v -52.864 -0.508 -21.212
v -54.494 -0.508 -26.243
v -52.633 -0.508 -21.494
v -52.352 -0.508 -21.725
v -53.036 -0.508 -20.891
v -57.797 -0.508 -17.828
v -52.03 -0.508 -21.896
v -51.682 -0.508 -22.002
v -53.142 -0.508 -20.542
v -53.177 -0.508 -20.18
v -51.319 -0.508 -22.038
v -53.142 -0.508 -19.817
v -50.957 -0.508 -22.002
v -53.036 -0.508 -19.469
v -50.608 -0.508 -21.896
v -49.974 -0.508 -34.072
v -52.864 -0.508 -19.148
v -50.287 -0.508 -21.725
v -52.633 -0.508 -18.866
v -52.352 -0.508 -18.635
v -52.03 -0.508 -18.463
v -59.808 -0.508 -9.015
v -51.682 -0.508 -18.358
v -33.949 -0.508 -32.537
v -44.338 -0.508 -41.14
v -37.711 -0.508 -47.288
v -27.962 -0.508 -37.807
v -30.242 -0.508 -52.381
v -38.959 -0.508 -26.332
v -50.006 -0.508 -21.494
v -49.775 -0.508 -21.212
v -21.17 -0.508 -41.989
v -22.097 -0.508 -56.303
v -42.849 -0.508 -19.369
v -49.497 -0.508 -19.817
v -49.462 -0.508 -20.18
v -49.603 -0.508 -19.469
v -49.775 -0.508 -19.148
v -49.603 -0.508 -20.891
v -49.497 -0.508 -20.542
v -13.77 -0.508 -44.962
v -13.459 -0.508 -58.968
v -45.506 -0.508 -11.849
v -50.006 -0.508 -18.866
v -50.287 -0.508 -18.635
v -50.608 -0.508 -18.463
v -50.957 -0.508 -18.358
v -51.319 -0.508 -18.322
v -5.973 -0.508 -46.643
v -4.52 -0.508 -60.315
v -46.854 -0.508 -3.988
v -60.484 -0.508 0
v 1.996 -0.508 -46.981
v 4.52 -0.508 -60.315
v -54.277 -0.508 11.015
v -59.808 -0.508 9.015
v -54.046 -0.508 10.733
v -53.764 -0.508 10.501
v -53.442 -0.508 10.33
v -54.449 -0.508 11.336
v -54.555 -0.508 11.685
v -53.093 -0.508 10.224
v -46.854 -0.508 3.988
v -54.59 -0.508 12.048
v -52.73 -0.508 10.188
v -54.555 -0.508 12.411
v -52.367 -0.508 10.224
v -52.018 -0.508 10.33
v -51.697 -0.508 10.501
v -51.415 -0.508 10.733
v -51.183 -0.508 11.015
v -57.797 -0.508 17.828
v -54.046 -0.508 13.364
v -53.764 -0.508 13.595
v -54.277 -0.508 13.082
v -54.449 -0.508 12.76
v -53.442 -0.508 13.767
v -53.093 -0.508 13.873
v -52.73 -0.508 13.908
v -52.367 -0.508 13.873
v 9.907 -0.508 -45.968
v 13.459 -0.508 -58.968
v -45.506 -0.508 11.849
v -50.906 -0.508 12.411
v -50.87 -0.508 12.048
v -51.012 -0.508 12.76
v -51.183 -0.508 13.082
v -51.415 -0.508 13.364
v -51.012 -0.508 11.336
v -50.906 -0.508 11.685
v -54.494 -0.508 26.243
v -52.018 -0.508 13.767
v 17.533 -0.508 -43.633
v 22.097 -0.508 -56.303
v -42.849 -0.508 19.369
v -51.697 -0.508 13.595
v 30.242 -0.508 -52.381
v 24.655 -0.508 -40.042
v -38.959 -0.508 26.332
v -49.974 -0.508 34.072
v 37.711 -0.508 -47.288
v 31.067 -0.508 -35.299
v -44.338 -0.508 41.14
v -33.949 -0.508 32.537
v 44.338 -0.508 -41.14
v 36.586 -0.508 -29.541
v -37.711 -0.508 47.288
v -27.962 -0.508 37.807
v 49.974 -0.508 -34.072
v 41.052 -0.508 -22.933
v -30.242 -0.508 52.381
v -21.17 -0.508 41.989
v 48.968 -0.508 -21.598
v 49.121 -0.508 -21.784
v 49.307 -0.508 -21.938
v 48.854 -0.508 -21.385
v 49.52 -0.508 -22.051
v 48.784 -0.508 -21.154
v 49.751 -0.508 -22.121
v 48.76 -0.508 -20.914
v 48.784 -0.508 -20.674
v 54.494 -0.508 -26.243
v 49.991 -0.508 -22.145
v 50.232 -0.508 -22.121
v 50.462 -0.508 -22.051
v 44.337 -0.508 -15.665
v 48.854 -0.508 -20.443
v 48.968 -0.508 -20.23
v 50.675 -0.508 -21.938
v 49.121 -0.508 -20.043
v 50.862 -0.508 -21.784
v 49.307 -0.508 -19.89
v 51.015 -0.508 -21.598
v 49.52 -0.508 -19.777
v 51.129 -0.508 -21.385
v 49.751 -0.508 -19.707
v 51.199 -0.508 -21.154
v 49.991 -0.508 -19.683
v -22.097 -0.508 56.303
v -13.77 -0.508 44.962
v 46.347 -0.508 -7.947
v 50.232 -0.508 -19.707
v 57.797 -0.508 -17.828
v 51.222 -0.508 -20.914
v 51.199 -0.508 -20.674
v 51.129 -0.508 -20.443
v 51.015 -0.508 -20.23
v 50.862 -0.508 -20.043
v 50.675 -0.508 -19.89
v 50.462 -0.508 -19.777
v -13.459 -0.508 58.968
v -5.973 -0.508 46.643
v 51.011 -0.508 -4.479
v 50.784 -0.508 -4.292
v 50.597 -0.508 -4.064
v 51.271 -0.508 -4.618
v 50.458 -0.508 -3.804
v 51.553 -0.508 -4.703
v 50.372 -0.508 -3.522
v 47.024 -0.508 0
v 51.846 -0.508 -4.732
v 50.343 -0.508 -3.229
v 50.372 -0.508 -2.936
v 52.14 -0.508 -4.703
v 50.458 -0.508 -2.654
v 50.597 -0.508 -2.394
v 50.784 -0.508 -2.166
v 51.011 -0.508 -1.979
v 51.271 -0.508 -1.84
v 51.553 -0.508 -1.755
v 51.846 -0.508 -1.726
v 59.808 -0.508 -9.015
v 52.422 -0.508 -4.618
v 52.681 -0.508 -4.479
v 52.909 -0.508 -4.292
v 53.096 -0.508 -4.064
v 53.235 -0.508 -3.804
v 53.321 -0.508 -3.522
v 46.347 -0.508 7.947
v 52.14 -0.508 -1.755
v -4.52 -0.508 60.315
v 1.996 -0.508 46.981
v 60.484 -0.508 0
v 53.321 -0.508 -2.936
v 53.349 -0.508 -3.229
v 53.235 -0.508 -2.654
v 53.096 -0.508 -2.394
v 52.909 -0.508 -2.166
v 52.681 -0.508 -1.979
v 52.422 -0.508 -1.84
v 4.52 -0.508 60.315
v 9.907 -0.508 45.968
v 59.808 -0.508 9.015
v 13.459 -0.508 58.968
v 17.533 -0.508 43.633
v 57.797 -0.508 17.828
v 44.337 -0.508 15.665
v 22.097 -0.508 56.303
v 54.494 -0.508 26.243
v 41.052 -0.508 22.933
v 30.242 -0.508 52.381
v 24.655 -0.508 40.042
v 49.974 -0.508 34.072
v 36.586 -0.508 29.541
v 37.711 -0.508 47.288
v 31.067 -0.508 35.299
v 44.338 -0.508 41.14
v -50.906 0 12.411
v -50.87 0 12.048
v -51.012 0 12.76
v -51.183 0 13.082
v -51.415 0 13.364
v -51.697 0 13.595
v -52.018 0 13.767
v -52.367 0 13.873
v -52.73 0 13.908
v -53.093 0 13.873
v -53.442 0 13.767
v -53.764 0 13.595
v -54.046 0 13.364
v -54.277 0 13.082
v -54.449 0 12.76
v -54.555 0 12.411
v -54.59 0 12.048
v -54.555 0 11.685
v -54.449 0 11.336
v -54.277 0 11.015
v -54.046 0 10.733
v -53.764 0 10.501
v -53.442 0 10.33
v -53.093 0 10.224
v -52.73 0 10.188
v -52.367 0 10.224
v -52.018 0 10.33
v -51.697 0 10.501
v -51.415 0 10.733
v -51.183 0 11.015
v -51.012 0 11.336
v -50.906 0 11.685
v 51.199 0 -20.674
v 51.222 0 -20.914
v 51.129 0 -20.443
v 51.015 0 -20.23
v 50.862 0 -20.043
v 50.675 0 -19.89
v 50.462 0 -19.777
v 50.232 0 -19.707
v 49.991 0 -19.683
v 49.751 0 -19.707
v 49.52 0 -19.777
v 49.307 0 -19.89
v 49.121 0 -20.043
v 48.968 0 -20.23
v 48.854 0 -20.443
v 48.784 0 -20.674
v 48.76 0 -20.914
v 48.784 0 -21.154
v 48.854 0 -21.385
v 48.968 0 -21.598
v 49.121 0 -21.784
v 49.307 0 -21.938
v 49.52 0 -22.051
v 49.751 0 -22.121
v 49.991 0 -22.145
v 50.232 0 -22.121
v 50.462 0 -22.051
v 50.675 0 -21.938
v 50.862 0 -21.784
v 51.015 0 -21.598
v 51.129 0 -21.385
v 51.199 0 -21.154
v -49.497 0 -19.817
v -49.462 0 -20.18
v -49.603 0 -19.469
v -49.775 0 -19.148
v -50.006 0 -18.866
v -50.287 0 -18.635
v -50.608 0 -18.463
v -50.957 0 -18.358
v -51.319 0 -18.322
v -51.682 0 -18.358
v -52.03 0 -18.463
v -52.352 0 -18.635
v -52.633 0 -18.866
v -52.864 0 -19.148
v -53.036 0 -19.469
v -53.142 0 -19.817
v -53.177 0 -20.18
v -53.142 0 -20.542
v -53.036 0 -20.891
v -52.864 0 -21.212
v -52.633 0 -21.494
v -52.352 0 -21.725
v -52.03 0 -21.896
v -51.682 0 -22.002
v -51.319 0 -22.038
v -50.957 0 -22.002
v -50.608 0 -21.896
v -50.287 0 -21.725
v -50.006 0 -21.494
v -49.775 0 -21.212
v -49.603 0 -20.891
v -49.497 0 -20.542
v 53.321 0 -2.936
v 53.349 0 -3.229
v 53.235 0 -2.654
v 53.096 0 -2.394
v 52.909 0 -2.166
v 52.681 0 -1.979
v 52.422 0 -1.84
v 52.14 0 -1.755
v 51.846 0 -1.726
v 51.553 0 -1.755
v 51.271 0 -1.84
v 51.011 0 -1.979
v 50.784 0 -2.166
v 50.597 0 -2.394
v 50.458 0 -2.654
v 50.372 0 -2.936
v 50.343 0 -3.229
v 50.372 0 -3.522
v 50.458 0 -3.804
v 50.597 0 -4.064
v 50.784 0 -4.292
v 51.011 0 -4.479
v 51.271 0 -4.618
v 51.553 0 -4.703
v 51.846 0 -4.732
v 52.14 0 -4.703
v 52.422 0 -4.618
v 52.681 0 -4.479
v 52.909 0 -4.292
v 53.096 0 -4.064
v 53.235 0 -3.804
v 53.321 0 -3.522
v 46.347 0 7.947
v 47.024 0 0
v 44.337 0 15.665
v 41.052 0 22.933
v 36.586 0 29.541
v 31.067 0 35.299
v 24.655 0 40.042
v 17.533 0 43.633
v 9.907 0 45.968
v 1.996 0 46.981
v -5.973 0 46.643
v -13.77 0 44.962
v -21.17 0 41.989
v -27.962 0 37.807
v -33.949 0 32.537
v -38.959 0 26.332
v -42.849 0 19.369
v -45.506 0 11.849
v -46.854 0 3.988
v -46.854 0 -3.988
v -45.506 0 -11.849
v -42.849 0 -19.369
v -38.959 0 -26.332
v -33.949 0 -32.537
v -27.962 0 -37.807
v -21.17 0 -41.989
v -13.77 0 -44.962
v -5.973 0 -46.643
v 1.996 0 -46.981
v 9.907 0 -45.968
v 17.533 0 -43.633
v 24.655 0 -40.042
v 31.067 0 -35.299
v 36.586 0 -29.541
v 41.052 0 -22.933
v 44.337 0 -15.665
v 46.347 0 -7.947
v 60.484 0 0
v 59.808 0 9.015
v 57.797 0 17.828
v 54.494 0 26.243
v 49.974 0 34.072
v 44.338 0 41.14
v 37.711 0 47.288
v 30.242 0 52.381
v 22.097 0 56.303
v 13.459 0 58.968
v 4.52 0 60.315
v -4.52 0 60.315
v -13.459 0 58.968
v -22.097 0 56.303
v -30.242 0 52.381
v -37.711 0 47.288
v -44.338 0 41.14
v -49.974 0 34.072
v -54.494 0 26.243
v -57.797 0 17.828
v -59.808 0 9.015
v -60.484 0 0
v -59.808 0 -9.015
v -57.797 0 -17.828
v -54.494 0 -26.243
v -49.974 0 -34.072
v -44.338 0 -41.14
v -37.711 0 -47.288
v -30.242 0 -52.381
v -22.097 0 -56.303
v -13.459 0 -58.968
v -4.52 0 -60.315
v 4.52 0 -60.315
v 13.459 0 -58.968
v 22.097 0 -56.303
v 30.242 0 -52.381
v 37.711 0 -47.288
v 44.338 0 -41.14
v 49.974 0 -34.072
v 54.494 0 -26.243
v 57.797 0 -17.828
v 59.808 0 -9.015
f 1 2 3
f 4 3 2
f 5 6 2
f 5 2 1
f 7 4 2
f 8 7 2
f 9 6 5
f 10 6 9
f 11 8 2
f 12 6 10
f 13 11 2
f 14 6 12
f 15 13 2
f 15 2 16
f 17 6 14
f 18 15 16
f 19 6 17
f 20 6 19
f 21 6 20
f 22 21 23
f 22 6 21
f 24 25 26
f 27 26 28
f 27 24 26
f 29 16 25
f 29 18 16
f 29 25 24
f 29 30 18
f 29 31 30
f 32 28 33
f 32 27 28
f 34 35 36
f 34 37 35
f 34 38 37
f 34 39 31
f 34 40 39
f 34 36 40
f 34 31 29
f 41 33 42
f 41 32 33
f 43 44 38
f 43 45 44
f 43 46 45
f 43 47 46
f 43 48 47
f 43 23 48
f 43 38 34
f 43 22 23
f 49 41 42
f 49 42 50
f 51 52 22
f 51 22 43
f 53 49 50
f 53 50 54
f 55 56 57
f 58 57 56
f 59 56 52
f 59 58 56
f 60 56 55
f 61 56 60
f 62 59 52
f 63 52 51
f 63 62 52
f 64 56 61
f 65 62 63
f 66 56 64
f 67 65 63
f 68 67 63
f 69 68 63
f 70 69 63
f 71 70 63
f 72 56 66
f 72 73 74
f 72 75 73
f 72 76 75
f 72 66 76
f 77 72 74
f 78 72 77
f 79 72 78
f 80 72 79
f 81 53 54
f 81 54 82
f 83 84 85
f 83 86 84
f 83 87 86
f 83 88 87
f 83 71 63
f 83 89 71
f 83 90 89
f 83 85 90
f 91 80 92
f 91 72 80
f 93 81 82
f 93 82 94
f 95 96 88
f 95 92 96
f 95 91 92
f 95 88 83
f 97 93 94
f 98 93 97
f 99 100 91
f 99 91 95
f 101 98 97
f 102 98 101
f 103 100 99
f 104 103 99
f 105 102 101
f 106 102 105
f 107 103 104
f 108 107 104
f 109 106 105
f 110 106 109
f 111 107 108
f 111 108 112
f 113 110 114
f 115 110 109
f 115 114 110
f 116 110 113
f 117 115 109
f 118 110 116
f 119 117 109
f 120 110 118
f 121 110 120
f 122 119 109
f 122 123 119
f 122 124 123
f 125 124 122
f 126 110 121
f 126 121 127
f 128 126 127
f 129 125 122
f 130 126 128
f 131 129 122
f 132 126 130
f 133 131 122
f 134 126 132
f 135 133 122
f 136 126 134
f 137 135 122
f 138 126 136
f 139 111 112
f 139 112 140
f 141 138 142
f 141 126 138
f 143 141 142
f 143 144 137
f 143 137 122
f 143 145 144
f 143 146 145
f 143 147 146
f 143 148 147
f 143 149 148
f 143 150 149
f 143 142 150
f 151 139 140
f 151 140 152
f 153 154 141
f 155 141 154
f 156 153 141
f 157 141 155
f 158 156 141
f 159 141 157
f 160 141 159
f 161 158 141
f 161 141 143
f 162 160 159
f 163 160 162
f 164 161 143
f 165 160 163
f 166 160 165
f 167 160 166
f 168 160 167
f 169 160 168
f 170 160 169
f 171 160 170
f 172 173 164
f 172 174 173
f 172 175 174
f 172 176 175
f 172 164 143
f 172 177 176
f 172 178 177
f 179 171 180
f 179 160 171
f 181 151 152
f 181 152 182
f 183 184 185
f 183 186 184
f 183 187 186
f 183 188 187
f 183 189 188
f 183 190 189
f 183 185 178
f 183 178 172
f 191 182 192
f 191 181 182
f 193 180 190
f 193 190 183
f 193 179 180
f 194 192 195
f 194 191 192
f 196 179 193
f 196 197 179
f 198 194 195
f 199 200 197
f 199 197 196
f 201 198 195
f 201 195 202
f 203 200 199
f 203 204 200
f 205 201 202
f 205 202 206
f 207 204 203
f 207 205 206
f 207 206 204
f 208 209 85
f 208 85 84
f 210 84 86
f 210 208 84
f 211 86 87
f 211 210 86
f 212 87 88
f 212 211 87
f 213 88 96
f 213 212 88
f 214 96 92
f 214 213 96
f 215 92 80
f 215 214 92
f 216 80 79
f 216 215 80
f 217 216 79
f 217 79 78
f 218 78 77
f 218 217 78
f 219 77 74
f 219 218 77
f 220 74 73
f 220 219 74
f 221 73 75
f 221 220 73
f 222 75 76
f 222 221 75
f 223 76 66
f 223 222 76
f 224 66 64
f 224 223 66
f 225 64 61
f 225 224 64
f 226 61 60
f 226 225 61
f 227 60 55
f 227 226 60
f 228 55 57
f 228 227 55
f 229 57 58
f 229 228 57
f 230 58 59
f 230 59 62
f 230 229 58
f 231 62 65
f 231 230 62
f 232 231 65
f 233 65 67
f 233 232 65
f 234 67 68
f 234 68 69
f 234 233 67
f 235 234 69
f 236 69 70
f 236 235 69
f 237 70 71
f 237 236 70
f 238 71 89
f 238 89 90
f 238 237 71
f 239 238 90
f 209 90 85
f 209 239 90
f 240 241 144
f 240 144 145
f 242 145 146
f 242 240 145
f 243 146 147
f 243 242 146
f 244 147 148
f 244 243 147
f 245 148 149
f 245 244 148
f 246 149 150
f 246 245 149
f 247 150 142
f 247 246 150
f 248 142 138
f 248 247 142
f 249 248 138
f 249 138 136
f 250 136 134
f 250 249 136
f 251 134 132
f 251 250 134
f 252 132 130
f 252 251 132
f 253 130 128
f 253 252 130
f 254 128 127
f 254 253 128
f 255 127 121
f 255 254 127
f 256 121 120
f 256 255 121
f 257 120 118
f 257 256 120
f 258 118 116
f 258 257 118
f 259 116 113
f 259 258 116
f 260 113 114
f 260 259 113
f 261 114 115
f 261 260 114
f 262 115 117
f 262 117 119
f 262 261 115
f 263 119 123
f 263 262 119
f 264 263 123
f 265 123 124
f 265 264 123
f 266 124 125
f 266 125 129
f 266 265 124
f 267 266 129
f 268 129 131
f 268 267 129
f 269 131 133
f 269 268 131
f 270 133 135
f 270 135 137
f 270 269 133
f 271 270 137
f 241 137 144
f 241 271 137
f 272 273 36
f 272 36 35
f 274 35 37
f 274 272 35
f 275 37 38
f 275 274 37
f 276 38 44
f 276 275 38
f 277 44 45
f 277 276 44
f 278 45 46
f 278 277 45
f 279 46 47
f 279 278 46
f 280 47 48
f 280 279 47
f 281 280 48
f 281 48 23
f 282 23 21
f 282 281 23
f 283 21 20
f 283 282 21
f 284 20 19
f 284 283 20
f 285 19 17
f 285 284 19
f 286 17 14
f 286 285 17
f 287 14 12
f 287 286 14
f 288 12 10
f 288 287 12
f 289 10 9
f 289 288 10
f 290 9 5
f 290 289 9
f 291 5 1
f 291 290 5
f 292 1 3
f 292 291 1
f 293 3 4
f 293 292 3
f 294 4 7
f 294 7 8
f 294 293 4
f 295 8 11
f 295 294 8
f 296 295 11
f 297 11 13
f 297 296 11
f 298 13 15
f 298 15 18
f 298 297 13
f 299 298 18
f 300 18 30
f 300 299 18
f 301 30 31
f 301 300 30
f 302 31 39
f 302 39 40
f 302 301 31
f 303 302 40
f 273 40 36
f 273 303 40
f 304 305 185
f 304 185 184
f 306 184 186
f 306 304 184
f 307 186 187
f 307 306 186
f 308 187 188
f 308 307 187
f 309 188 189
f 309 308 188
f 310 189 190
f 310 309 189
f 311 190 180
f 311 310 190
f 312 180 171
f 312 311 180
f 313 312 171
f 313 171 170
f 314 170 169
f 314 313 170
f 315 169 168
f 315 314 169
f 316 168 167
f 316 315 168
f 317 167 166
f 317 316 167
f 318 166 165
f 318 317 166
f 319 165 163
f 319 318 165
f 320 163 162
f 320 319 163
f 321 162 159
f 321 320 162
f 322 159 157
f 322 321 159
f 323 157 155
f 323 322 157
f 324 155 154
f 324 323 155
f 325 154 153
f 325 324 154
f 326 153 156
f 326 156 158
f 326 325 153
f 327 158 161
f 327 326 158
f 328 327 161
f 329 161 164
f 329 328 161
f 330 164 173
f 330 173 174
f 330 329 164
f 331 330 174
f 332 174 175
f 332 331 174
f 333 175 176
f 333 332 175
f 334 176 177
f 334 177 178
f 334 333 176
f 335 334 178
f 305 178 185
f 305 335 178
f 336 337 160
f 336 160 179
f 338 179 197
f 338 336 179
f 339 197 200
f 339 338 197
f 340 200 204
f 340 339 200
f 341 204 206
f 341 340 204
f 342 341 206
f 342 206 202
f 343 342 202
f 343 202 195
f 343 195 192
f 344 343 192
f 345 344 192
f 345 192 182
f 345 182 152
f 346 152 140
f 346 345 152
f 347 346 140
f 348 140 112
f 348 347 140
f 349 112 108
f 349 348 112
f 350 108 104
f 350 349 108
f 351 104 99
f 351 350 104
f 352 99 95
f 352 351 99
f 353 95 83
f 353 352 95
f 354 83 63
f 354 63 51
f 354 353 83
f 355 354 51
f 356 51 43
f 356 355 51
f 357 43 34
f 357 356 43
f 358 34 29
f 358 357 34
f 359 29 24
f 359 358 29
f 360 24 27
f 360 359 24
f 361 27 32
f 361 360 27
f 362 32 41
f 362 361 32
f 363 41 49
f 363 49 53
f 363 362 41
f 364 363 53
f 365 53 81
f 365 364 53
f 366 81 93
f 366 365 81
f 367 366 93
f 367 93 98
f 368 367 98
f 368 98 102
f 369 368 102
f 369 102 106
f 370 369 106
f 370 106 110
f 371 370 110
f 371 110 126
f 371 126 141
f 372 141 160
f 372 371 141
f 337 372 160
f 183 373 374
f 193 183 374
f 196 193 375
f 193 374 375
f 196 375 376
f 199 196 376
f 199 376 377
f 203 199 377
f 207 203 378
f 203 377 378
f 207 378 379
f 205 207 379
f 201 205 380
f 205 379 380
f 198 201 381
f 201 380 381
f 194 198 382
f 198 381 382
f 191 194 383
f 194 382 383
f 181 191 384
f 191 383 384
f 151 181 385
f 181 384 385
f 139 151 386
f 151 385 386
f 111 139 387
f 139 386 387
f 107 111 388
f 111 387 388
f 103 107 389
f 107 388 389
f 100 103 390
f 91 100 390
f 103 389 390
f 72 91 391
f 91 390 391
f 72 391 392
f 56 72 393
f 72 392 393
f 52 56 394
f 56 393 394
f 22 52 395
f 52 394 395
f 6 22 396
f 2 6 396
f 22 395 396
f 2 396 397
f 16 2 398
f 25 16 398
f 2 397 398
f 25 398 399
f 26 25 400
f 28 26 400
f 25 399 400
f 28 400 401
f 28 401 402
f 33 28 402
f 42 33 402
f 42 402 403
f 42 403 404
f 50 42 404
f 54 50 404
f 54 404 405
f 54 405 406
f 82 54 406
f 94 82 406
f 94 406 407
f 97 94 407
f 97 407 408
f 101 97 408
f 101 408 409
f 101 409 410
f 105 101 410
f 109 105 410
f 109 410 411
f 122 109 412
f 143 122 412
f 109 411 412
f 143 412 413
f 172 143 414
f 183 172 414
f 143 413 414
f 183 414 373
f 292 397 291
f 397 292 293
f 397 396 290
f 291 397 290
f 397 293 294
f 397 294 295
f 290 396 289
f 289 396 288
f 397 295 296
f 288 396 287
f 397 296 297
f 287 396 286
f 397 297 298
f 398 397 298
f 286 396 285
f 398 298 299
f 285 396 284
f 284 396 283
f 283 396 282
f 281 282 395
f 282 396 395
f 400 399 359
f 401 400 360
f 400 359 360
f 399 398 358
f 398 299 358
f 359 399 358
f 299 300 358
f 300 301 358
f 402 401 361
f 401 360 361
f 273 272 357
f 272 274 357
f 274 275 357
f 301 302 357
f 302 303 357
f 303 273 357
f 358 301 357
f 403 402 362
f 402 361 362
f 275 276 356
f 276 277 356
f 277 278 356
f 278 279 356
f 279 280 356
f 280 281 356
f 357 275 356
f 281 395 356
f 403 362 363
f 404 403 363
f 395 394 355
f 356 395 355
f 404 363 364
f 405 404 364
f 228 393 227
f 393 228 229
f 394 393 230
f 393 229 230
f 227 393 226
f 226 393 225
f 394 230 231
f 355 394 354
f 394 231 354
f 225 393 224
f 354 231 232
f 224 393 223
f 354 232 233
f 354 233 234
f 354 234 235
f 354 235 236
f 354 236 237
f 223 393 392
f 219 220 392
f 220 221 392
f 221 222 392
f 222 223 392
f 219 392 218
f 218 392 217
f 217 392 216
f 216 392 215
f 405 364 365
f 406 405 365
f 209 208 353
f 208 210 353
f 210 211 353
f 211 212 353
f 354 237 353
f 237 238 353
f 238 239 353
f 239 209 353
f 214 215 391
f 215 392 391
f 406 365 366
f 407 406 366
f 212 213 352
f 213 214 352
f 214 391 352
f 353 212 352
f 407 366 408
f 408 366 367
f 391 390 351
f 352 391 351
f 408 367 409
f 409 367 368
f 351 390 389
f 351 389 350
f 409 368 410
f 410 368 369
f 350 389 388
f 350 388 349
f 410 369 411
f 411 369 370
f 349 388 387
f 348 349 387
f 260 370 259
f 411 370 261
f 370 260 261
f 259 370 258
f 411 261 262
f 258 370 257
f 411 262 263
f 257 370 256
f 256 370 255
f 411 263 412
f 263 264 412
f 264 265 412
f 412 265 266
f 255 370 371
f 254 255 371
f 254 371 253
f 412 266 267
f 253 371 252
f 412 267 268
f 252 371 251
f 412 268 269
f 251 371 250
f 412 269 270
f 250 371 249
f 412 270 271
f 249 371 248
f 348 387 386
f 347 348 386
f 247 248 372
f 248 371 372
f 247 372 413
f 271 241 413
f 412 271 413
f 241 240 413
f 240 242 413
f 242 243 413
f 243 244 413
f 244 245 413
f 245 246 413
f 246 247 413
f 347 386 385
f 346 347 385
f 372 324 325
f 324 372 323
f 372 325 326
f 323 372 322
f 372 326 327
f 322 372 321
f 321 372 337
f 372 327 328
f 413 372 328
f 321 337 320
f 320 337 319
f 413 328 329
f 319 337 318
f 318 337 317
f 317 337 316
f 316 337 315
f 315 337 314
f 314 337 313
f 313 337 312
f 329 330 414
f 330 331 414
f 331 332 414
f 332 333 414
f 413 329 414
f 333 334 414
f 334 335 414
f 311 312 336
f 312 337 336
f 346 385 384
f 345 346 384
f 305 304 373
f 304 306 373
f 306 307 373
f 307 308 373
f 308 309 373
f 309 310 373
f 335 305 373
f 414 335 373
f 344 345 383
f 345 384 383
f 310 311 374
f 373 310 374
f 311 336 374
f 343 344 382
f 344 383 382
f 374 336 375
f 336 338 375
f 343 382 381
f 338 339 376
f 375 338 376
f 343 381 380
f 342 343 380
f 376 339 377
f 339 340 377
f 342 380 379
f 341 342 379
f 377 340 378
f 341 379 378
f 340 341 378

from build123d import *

# Parameters (mm, degrees)
F0_R     = 60.484024
F0_R_2   = 1.857944
F0_R_3   = 1.231078
F0_R_4   = 1.503057
F0_R_5   = 1.860203
F0_R_6   = 47.023522
F1_DEPTH = 0.508


with BuildPart() as f1:
    # F0 (on Front) → F1 (new body)
    with BuildSketch(Plane.XZ):
        Circle(F0_R)
        with Locations((-51.31948, -20.179848)):
            Circle(F0_R_2, mode=Mode.SUBTRACT)
        with Locations((49.991365, -20.913929)):
            Circle(F0_R_3, mode=Mode.SUBTRACT)
        with Locations((51.846373, -3.229027)):
            Circle(F0_R_4, mode=Mode.SUBTRACT)
        with Locations((-52.730181, 12.048138)):
            Circle(F0_R_5, mode=Mode.SUBTRACT)
        Circle(F0_R_6, mode=Mode.SUBTRACT)
    extrude(amount=F1_DEPTH)


solid = f1.part
